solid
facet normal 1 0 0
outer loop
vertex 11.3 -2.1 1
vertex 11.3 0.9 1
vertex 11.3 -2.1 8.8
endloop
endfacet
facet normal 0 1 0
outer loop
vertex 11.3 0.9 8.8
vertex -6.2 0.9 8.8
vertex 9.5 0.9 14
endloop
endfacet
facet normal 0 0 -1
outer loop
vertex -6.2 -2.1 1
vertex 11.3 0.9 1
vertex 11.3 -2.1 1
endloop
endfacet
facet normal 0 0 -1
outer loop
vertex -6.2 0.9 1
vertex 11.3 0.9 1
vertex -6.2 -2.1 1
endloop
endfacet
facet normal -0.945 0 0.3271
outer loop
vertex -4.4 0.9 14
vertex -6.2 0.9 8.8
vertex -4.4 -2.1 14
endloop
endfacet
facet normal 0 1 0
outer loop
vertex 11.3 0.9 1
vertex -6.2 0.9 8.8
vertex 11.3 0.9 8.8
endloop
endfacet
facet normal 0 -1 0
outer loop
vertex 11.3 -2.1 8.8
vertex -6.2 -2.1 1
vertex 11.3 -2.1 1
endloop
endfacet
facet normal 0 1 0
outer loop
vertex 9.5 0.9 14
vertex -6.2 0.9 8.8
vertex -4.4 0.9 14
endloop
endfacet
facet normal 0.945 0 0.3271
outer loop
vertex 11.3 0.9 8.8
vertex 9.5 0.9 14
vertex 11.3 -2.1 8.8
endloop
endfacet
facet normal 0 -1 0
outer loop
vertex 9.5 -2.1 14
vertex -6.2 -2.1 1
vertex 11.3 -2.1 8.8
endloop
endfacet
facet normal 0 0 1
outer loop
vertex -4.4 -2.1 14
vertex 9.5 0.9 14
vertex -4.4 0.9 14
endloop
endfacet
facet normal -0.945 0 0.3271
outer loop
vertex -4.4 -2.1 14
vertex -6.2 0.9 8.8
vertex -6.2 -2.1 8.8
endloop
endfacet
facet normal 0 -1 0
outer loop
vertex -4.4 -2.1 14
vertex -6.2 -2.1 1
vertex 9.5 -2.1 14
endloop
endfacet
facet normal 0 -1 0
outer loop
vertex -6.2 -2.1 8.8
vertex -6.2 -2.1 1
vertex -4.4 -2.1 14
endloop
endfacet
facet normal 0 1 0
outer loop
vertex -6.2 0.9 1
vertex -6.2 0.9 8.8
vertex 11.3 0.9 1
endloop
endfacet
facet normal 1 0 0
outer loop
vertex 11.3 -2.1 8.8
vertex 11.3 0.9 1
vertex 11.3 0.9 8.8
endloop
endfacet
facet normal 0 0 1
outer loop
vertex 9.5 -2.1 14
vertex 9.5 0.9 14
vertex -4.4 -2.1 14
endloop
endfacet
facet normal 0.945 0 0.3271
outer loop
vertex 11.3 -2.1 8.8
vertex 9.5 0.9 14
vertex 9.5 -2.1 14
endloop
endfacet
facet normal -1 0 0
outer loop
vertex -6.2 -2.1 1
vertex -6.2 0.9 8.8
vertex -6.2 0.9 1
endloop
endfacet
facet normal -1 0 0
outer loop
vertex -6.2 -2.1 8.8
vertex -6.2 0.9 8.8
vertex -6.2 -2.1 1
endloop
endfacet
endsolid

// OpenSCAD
// Radial PTC fuse (F1), the outline of the Bourns MF-RG1100 footprint. Made for 3d/populated: the KiCad model
// Fuse.3dshapes/Fuse_Bourns_MF-RG1100.step is not on this machine.
//
// layers: body=#d8a31f leads=#c9c9c9
//
// FRAME  KiCad model frame. Pad 1 at (0, 0), pad 2 at (5.1, -1.2) (footprint y +1.2 negated).
//
// DIMENSIONS                       value            kind
//   body width x thickness    17.5 x 3.0 mm      MEASURED (repo source): TS06_Fuse_PTC_MF-RG1100.kicad_mod F.Fab rectangle
//                                                (x -6.2..11.3, y -0.9..2.1), centred between the pads
//   body height               13.0 mm            INFERRED: case_pair.py FP_H "radial PTC" 13.0 (assumed there); the stock
//                                                footprint states none. PCB/TS06-DRV/bom.md notes the real fitted part is a
//                                                smaller MF-R110; the 11 A outline is drawn because it is the footprint
//   lift off the board        1.0 mm             INFERRED
//   leads D1.0 (pad drill 1.01)                  MEASURED (footprint pads: D2.01, drill 1.01); 2.5 mm through the board INFERRED
L = "body";
W = 17.5;
T = 3.0;
H = 13.0;
LIFT = 1.0;
cx = 2.55;
cy = -0.6;

if (L == "body") translate([cx, cy, LIFT])
    hull() {
        translate([-W / 2, -T / 2, 0]) cube([W, T, H * 0.6]);
        translate([-W / 2 + 1.8, -T / 2, 0]) cube([W - 3.6, T, H]);
    }
if (L == "leads") {
    translate([0, 0, -2.5]) cylinder(d = 1.0, h = 2.5 + LIFT + 0.5, $fn = 12);
    translate([5.1, -1.2, -2.5]) cylinder(d = 1.0, h = 2.5 + LIFT + 0.5, $fn = 12);
}
